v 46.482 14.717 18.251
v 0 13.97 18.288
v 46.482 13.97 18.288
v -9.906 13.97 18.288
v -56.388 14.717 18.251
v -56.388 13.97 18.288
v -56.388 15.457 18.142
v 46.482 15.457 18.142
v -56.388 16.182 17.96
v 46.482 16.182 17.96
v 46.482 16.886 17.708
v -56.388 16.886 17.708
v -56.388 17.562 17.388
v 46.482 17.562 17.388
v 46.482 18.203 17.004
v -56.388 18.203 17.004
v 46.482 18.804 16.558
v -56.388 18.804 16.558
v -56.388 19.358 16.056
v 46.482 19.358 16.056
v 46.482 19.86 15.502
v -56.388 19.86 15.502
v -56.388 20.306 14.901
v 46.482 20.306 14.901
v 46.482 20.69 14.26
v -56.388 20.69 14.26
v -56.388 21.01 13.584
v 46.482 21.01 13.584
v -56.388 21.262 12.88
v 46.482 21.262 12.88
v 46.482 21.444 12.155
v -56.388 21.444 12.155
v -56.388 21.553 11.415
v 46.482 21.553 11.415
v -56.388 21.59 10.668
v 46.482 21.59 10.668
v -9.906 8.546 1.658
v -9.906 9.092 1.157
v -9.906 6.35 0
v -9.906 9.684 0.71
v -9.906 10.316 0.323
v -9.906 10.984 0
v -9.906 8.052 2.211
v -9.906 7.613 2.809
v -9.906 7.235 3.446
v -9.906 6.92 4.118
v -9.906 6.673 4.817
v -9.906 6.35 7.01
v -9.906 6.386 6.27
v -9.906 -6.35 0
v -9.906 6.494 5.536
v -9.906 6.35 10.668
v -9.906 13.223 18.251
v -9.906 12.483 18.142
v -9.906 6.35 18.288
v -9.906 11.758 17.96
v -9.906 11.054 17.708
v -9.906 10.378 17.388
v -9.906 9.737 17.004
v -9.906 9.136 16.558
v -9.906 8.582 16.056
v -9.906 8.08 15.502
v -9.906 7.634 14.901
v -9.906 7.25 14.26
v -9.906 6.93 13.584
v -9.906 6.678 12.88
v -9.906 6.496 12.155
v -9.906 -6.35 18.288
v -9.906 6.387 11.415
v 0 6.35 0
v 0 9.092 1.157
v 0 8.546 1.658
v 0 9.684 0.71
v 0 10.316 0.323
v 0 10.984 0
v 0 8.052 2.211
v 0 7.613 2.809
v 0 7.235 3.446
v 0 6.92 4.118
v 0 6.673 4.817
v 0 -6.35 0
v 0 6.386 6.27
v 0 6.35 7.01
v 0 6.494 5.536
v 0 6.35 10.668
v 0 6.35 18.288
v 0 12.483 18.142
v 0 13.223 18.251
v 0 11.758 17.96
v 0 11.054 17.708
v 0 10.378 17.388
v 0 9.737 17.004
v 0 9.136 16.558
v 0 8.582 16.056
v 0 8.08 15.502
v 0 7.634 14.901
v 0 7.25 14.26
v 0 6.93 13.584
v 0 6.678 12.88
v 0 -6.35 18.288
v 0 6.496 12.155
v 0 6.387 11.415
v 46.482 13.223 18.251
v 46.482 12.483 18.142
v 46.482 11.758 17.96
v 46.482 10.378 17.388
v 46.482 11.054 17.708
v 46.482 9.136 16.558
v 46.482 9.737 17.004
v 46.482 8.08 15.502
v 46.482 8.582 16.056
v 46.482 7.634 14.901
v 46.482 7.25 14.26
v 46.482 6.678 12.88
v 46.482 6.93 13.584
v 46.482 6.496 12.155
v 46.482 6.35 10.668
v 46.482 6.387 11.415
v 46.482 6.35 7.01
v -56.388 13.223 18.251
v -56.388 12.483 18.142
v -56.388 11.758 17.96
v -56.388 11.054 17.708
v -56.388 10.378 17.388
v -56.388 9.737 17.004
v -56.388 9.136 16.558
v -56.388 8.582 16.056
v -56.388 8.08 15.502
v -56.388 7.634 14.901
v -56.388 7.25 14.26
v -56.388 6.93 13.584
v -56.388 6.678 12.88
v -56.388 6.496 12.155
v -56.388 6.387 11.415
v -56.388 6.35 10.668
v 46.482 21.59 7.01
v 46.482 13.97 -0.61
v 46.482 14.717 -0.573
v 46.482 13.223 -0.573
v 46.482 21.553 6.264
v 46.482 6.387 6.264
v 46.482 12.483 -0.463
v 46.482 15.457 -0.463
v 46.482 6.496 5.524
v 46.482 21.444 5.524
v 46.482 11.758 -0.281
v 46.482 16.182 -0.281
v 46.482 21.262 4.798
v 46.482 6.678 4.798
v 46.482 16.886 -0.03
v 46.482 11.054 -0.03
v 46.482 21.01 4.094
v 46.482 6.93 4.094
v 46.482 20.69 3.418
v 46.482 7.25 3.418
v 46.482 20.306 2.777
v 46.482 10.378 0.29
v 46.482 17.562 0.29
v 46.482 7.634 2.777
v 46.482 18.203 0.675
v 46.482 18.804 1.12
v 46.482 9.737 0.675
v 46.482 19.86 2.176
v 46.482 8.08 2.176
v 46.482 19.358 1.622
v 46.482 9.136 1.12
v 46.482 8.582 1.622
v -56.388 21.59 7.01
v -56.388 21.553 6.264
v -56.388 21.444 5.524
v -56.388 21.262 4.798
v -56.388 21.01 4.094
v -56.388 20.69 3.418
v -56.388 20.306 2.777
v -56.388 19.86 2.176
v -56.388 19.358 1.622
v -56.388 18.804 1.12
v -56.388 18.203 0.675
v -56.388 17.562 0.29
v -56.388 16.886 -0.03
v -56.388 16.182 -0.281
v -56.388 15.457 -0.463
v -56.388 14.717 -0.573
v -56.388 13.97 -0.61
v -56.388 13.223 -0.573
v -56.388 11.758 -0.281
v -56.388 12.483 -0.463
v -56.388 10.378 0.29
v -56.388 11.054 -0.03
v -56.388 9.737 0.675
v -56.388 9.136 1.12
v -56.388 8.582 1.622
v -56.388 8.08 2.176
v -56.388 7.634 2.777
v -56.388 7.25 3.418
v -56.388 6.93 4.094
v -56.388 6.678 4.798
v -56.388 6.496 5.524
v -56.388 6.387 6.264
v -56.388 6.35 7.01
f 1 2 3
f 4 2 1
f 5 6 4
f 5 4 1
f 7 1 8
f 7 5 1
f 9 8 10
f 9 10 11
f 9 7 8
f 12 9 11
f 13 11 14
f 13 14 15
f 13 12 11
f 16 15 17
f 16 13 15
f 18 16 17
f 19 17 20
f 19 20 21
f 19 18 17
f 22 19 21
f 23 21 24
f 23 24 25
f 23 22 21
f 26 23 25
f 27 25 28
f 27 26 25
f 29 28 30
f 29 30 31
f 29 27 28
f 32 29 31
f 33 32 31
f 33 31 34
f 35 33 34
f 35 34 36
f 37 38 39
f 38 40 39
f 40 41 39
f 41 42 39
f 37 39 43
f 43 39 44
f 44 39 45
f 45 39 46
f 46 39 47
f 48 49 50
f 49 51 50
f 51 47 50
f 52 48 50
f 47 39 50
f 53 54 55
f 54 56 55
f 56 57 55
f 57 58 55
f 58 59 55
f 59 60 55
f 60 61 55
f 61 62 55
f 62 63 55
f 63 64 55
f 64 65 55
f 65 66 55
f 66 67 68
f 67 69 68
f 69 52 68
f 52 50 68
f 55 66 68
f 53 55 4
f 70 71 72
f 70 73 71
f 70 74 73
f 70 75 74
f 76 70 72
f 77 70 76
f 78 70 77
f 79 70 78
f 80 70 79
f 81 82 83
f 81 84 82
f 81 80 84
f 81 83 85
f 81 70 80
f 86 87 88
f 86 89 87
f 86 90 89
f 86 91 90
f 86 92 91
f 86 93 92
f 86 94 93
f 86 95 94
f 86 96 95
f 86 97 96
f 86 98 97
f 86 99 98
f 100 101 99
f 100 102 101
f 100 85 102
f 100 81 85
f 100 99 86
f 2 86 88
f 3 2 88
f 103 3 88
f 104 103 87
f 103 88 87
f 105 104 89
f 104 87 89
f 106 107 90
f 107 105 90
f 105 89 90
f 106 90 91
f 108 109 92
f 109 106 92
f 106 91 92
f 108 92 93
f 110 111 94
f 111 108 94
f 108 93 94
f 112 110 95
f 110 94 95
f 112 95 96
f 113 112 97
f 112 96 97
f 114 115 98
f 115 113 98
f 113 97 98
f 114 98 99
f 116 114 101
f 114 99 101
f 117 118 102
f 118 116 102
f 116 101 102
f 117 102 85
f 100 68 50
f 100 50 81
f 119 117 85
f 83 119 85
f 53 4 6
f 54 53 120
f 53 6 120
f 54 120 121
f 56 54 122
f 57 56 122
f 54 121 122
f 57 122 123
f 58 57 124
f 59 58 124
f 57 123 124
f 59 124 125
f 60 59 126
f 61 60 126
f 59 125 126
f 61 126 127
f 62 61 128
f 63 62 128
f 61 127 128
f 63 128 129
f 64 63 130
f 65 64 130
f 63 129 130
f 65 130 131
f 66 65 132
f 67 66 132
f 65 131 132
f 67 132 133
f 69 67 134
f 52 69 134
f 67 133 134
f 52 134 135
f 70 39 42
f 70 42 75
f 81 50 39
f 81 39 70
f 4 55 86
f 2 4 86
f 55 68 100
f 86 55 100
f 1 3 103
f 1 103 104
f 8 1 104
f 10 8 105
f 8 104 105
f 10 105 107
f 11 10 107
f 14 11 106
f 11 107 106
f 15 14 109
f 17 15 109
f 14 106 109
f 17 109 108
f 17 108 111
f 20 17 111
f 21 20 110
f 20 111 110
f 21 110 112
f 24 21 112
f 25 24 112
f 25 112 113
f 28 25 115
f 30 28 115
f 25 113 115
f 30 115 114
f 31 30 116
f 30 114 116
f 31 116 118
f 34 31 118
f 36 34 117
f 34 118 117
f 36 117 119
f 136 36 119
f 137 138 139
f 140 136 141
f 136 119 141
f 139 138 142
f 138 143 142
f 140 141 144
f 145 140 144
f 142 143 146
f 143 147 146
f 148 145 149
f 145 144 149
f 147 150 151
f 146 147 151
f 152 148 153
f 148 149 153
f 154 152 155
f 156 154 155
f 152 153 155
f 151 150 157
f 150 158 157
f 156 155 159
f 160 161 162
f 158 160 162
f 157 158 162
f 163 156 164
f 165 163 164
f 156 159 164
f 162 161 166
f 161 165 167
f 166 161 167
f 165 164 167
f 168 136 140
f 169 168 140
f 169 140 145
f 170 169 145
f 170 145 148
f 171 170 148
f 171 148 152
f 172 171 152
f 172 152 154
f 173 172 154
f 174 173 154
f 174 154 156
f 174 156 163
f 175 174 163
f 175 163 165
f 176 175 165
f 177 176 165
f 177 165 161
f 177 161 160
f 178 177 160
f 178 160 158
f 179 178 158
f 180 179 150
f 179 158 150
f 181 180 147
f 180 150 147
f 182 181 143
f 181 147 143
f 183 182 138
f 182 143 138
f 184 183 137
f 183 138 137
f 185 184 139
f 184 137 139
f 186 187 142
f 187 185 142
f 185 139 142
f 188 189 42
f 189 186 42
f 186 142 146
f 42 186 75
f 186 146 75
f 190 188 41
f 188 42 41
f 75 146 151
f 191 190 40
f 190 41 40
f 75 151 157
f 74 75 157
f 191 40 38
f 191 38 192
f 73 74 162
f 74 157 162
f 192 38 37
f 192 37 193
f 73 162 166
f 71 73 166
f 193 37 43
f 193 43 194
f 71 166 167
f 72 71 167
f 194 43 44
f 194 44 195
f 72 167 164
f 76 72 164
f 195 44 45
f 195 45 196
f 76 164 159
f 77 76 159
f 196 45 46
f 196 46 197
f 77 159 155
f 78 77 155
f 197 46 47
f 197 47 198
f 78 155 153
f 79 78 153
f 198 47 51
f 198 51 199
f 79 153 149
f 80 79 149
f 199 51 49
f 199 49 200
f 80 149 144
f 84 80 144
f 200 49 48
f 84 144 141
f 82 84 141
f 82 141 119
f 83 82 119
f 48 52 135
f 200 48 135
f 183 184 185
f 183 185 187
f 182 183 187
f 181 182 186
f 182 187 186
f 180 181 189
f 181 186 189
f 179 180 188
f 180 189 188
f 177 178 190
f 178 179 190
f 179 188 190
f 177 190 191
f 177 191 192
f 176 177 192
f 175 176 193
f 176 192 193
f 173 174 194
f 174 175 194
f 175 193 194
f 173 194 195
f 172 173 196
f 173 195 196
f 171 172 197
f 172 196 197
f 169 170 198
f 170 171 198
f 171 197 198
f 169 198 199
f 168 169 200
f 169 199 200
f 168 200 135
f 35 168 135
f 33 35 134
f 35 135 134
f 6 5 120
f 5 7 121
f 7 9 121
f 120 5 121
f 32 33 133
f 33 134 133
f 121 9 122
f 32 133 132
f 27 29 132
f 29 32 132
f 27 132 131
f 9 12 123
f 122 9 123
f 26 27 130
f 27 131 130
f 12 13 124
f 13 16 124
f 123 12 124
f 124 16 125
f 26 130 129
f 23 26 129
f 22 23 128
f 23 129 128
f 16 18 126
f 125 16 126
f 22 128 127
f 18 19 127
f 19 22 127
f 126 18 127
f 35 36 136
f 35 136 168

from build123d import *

# Parameters (mm, degrees)
F0_W         = 9.9060004577
F0_H         = 18.2879995555
F1_DEPTH     = 6.35
F2_W         = 9.9060004577
F2_H         = 18.2879995555
F3_DEPTH     = 15.24
F4_T1_DEPTH  = 140.9700014576
F4_T3_DEPTH  = 65.5320005
F4_T5_DEPTH  = 65.5320005
F4_T10_DEPTH = 140.9700014576
F4_T16_DEPTH = 140.9700014576
F4_T22_DEPTH = 140.9700014576
F4_T29_DEPTH = 140.9700014576
F4_T35_DEPTH = 140.9700014576
F4_T41_DEPTH = 84.5820005
F4_T46_DEPTH = 84.5820005


# Not quite as in the source:
# - a fillet or chamfer that OpenCascade refuses, or shapes differently, is made with other operations: its cross-section is extruded or revolved along the edge and cut away or added


with BuildPart() as f1:
    # F0 (on Front) → F1 (new body, symmetric)
    with BuildSketch(Plane.XZ):
        with Locations((-4.9530002289, 9.1439997777)):
            Rectangle(F0_W, F0_H)
    extrude(amount=F1_DEPTH, both=True)

    # F2 (on face) → F3 (join)
    with BuildSketch(Plane(origin=(0, 6.35, 0), x_dir=(-1, 0, 0), z_dir=(0, 1, 0))):
        Polygon((0, 18.2879995555), (-46.4820005, 18.2879995555), (-46.4820005, -0.6095990539), (56.3880009577, -0.6095990539), (56.3880009577, 18.2879995555), (9.9060004577, 18.2879995555), (9.9060004577, 0), (0, 0), align=None)
        with Locations((4.9530002289, 9.1439997777)):
            Rectangle(F2_W, F2_H)
    extrude(amount=F3_DEPTH)

    # F4: fillet of radius 7.62 on 5 edges, made by hand

    # F4_s2 → F4_t1 (cut)
    with BuildSketch(Plane.YZ.offset(-75.4380009577)):
        with BuildLine():
            ThreePointArc((13.97, -0.6095990539), (19.3581536726, 1.6222472735), (21.59, 7.0104009461))
            Line((21.59, 7.0104009461), (21.59, -0.6095990539))
            Line((21.59, -0.6095990539), (13.97, -0.6095990539))
        make_face()
        with BuildLine():
            ThreePointArc((13.97, 18.2879995555), (19.3581536726, 16.0561532281), (21.59, 10.6679995555))
            Line((21.59, 10.6679995555), (21.59, 18.2879995555))
            Line((21.59, 18.2879995555), (13.97, 18.2879995555))
        make_face()
    extrude(amount=F4_T1_DEPTH, mode=Mode.SUBTRACT)

    # F4_s4 → F4_t3 (cut)
    with BuildSketch(Plane.YZ.offset(-75.4380009577)):
        with BuildLine():
            ThreePointArc((13.97, 18.2879995555), (8.5818463274, 16.0561532281), (6.35, 10.6679995555))
            Line((6.35, 10.6679995555), (6.35, 18.2879995555))
            Line((6.35, 18.2879995555), (13.97, 18.2879995555))
        make_face()
    extrude(amount=F4_T3_DEPTH, mode=Mode.SUBTRACT)

    # F4_s6 → F4_t5 (cut)
    with BuildSketch(Plane.YZ):
        with BuildLine():
            ThreePointArc((13.97, 18.2879995555), (8.5818463274, 16.0561532281), (6.35, 10.6679995555))
            Line((6.35, 10.6679995555), (6.35, 18.2879995555))
            Line((6.35, 18.2879995555), (13.97, 18.2879995555))
        make_face()
    extrude(amount=F4_T5_DEPTH, mode=Mode.SUBTRACT)


with BuildPart() as f4_tool8:
    # F4_s9 → F4_t10 (new body)
    with BuildSketch(Plane.YZ.offset(65.5320005)):
        with BuildLine():
            ThreePointArc((13.97, -0.6095990539), (8.5818463274, 1.6222472735), (6.35, 7.0104009461))
            Line((6.35, 7.0104009461), (6.35, -0.6095990539))
            Line((6.35, -0.6095990539), (13.97, -0.6095990539))
        make_face()
    extrude(amount=-F4_T10_DEPTH)

    split(bisect_by=Plane.YZ, keep=Keep.TOP)

    split(bisect_by=Plane.XY, keep=Keep.BOTTOM)


with BuildPart() as f1_1:
    add(f1.part)

    # F4_t7: cut F4_tool8
    add(f4_tool8.part, mode=Mode.SUBTRACT)


with BuildPart() as f4_tool14:
    # F4_s15 → F4_t16 (new body)
    with BuildSketch(Plane.YZ.offset(65.5320005)):
        with BuildLine():
            ThreePointArc((13.97, -0.6095990539), (8.5818463274, 1.6222472735), (6.35, 7.0104009461))
            Line((6.35, 7.0104009461), (6.35, -0.6095990539))
            Line((6.35, -0.6095990539), (13.97, -0.6095990539))
        make_face()
    extrude(amount=-F4_T16_DEPTH)

    split(bisect_by=Plane.YZ, keep=Keep.TOP)

    split(bisect_by=Plane.XY, keep=Keep.TOP)


with BuildPart() as f1_2:
    add(f1_1.part)

    # F4_t13: cut F4_tool14
    add(f4_tool14.part, mode=Mode.SUBTRACT)


with BuildPart() as f4_tool20:
    # F4_s21 → F4_t22 (new body)
    with BuildSketch(Plane.YZ.offset(65.5320005)):
        with BuildLine():
            ThreePointArc((13.97, -0.6095990539), (8.5818463274, 1.6222472735), (6.35, 7.0104009461))
            Line((6.35, 7.0104009461), (6.35, -0.6095990539))
            Line((6.35, -0.6095990539), (13.97, -0.6095990539))
        make_face()
    extrude(amount=-F4_T22_DEPTH)

    split(bisect_by=Plane.YZ, keep=Keep.BOTTOM)

    split(bisect_by=Plane.XY, keep=Keep.BOTTOM)

    split(bisect_by=Plane.YZ.offset(-9.9060004577), keep=Keep.TOP)


with BuildPart() as f1_3:
    add(f1_2.part)

    # F4_t19: cut F4_tool20
    add(f4_tool20.part, mode=Mode.SUBTRACT)


with BuildPart() as f4_tool27:
    # F4_s28 → F4_t29 (new body)
    with BuildSketch(Plane.YZ.offset(65.5320005)):
        with BuildLine():
            ThreePointArc((13.97, -0.6095990539), (8.5818463274, 1.6222472735), (6.35, 7.0104009461))
            Line((6.35, 7.0104009461), (6.35, -0.6095990539))
            Line((6.35, -0.6095990539), (13.97, -0.6095990539))
        make_face()
    extrude(amount=-F4_T29_DEPTH)

    split(bisect_by=Plane.XY, keep=Keep.BOTTOM)

    split(bisect_by=Plane.YZ.offset(-9.9060004577), keep=Keep.BOTTOM)


with BuildPart() as f1_4:
    add(f1_3.part)

    # F4_t26: cut F4_tool27
    add(f4_tool27.part, mode=Mode.SUBTRACT)


with BuildPart() as f4_tool33:
    # F4_s34 → F4_t35 (new body)
    with BuildSketch(Plane.YZ.offset(65.5320005)):
        with BuildLine():
            ThreePointArc((13.97, -0.6095990539), (8.5818463274, 1.6222472735), (6.35, 7.0104009461))
            Line((6.35, 7.0104009461), (6.35, -0.6095990539))
            Line((6.35, -0.6095990539), (13.97, -0.6095990539))
        make_face()
    extrude(amount=-F4_T35_DEPTH)

    split(bisect_by=Plane.XY, keep=Keep.TOP)

    split(bisect_by=Plane.YZ.offset(-9.9060004577), keep=Keep.BOTTOM)


with BuildPart() as f1_5:
    add(f1_4.part)

    # F4_t32: cut F4_tool33
    add(f4_tool33.part, mode=Mode.SUBTRACT)


with BuildPart() as f4_tool39:
    # F4_s40 → F4_t41 (new body)
    with BuildSketch(Plane.YZ.offset(-75.4380009577)):
        with BuildLine():
            ThreePointArc((13.97, 18.2879995555), (8.5818463274, 16.0561532281), (6.35, 10.6679995555))
            Line((6.35, 10.6679995555), (6.35, 18.2879995555))
            Line((6.35, 18.2879995555), (13.97, 18.2879995555))
        make_face()
    extrude(amount=F4_T41_DEPTH)

    split(bisect_by=Plane.YZ, keep=Keep.TOP)


with BuildPart() as f1_6:
    add(f1_5.part)

    # F4_t38: cut F4_tool39
    add(f4_tool39.part, mode=Mode.SUBTRACT)


with BuildPart() as f4_tool44:
    # F4_s45 → F4_t46 (new body)
    with BuildSketch(Plane.YZ.offset(-19.05)):
        with BuildLine():
            ThreePointArc((13.97, 18.2879995555), (8.5818463274, 16.0561532281), (6.35, 10.6679995555))
            Line((6.35, 10.6679995555), (6.35, 18.2879995555))
            Line((6.35, 18.2879995555), (13.97, 18.2879995555))
        make_face()
    extrude(amount=F4_T46_DEPTH)

    split(bisect_by=Plane.YZ.offset(-9.9060004577), keep=Keep.BOTTOM)


with BuildPart() as f1_7:
    add(f1_6.part)

    # F4_t43: cut F4_tool44
    add(f4_tool44.part, mode=Mode.SUBTRACT)


solid = f1_7.part
